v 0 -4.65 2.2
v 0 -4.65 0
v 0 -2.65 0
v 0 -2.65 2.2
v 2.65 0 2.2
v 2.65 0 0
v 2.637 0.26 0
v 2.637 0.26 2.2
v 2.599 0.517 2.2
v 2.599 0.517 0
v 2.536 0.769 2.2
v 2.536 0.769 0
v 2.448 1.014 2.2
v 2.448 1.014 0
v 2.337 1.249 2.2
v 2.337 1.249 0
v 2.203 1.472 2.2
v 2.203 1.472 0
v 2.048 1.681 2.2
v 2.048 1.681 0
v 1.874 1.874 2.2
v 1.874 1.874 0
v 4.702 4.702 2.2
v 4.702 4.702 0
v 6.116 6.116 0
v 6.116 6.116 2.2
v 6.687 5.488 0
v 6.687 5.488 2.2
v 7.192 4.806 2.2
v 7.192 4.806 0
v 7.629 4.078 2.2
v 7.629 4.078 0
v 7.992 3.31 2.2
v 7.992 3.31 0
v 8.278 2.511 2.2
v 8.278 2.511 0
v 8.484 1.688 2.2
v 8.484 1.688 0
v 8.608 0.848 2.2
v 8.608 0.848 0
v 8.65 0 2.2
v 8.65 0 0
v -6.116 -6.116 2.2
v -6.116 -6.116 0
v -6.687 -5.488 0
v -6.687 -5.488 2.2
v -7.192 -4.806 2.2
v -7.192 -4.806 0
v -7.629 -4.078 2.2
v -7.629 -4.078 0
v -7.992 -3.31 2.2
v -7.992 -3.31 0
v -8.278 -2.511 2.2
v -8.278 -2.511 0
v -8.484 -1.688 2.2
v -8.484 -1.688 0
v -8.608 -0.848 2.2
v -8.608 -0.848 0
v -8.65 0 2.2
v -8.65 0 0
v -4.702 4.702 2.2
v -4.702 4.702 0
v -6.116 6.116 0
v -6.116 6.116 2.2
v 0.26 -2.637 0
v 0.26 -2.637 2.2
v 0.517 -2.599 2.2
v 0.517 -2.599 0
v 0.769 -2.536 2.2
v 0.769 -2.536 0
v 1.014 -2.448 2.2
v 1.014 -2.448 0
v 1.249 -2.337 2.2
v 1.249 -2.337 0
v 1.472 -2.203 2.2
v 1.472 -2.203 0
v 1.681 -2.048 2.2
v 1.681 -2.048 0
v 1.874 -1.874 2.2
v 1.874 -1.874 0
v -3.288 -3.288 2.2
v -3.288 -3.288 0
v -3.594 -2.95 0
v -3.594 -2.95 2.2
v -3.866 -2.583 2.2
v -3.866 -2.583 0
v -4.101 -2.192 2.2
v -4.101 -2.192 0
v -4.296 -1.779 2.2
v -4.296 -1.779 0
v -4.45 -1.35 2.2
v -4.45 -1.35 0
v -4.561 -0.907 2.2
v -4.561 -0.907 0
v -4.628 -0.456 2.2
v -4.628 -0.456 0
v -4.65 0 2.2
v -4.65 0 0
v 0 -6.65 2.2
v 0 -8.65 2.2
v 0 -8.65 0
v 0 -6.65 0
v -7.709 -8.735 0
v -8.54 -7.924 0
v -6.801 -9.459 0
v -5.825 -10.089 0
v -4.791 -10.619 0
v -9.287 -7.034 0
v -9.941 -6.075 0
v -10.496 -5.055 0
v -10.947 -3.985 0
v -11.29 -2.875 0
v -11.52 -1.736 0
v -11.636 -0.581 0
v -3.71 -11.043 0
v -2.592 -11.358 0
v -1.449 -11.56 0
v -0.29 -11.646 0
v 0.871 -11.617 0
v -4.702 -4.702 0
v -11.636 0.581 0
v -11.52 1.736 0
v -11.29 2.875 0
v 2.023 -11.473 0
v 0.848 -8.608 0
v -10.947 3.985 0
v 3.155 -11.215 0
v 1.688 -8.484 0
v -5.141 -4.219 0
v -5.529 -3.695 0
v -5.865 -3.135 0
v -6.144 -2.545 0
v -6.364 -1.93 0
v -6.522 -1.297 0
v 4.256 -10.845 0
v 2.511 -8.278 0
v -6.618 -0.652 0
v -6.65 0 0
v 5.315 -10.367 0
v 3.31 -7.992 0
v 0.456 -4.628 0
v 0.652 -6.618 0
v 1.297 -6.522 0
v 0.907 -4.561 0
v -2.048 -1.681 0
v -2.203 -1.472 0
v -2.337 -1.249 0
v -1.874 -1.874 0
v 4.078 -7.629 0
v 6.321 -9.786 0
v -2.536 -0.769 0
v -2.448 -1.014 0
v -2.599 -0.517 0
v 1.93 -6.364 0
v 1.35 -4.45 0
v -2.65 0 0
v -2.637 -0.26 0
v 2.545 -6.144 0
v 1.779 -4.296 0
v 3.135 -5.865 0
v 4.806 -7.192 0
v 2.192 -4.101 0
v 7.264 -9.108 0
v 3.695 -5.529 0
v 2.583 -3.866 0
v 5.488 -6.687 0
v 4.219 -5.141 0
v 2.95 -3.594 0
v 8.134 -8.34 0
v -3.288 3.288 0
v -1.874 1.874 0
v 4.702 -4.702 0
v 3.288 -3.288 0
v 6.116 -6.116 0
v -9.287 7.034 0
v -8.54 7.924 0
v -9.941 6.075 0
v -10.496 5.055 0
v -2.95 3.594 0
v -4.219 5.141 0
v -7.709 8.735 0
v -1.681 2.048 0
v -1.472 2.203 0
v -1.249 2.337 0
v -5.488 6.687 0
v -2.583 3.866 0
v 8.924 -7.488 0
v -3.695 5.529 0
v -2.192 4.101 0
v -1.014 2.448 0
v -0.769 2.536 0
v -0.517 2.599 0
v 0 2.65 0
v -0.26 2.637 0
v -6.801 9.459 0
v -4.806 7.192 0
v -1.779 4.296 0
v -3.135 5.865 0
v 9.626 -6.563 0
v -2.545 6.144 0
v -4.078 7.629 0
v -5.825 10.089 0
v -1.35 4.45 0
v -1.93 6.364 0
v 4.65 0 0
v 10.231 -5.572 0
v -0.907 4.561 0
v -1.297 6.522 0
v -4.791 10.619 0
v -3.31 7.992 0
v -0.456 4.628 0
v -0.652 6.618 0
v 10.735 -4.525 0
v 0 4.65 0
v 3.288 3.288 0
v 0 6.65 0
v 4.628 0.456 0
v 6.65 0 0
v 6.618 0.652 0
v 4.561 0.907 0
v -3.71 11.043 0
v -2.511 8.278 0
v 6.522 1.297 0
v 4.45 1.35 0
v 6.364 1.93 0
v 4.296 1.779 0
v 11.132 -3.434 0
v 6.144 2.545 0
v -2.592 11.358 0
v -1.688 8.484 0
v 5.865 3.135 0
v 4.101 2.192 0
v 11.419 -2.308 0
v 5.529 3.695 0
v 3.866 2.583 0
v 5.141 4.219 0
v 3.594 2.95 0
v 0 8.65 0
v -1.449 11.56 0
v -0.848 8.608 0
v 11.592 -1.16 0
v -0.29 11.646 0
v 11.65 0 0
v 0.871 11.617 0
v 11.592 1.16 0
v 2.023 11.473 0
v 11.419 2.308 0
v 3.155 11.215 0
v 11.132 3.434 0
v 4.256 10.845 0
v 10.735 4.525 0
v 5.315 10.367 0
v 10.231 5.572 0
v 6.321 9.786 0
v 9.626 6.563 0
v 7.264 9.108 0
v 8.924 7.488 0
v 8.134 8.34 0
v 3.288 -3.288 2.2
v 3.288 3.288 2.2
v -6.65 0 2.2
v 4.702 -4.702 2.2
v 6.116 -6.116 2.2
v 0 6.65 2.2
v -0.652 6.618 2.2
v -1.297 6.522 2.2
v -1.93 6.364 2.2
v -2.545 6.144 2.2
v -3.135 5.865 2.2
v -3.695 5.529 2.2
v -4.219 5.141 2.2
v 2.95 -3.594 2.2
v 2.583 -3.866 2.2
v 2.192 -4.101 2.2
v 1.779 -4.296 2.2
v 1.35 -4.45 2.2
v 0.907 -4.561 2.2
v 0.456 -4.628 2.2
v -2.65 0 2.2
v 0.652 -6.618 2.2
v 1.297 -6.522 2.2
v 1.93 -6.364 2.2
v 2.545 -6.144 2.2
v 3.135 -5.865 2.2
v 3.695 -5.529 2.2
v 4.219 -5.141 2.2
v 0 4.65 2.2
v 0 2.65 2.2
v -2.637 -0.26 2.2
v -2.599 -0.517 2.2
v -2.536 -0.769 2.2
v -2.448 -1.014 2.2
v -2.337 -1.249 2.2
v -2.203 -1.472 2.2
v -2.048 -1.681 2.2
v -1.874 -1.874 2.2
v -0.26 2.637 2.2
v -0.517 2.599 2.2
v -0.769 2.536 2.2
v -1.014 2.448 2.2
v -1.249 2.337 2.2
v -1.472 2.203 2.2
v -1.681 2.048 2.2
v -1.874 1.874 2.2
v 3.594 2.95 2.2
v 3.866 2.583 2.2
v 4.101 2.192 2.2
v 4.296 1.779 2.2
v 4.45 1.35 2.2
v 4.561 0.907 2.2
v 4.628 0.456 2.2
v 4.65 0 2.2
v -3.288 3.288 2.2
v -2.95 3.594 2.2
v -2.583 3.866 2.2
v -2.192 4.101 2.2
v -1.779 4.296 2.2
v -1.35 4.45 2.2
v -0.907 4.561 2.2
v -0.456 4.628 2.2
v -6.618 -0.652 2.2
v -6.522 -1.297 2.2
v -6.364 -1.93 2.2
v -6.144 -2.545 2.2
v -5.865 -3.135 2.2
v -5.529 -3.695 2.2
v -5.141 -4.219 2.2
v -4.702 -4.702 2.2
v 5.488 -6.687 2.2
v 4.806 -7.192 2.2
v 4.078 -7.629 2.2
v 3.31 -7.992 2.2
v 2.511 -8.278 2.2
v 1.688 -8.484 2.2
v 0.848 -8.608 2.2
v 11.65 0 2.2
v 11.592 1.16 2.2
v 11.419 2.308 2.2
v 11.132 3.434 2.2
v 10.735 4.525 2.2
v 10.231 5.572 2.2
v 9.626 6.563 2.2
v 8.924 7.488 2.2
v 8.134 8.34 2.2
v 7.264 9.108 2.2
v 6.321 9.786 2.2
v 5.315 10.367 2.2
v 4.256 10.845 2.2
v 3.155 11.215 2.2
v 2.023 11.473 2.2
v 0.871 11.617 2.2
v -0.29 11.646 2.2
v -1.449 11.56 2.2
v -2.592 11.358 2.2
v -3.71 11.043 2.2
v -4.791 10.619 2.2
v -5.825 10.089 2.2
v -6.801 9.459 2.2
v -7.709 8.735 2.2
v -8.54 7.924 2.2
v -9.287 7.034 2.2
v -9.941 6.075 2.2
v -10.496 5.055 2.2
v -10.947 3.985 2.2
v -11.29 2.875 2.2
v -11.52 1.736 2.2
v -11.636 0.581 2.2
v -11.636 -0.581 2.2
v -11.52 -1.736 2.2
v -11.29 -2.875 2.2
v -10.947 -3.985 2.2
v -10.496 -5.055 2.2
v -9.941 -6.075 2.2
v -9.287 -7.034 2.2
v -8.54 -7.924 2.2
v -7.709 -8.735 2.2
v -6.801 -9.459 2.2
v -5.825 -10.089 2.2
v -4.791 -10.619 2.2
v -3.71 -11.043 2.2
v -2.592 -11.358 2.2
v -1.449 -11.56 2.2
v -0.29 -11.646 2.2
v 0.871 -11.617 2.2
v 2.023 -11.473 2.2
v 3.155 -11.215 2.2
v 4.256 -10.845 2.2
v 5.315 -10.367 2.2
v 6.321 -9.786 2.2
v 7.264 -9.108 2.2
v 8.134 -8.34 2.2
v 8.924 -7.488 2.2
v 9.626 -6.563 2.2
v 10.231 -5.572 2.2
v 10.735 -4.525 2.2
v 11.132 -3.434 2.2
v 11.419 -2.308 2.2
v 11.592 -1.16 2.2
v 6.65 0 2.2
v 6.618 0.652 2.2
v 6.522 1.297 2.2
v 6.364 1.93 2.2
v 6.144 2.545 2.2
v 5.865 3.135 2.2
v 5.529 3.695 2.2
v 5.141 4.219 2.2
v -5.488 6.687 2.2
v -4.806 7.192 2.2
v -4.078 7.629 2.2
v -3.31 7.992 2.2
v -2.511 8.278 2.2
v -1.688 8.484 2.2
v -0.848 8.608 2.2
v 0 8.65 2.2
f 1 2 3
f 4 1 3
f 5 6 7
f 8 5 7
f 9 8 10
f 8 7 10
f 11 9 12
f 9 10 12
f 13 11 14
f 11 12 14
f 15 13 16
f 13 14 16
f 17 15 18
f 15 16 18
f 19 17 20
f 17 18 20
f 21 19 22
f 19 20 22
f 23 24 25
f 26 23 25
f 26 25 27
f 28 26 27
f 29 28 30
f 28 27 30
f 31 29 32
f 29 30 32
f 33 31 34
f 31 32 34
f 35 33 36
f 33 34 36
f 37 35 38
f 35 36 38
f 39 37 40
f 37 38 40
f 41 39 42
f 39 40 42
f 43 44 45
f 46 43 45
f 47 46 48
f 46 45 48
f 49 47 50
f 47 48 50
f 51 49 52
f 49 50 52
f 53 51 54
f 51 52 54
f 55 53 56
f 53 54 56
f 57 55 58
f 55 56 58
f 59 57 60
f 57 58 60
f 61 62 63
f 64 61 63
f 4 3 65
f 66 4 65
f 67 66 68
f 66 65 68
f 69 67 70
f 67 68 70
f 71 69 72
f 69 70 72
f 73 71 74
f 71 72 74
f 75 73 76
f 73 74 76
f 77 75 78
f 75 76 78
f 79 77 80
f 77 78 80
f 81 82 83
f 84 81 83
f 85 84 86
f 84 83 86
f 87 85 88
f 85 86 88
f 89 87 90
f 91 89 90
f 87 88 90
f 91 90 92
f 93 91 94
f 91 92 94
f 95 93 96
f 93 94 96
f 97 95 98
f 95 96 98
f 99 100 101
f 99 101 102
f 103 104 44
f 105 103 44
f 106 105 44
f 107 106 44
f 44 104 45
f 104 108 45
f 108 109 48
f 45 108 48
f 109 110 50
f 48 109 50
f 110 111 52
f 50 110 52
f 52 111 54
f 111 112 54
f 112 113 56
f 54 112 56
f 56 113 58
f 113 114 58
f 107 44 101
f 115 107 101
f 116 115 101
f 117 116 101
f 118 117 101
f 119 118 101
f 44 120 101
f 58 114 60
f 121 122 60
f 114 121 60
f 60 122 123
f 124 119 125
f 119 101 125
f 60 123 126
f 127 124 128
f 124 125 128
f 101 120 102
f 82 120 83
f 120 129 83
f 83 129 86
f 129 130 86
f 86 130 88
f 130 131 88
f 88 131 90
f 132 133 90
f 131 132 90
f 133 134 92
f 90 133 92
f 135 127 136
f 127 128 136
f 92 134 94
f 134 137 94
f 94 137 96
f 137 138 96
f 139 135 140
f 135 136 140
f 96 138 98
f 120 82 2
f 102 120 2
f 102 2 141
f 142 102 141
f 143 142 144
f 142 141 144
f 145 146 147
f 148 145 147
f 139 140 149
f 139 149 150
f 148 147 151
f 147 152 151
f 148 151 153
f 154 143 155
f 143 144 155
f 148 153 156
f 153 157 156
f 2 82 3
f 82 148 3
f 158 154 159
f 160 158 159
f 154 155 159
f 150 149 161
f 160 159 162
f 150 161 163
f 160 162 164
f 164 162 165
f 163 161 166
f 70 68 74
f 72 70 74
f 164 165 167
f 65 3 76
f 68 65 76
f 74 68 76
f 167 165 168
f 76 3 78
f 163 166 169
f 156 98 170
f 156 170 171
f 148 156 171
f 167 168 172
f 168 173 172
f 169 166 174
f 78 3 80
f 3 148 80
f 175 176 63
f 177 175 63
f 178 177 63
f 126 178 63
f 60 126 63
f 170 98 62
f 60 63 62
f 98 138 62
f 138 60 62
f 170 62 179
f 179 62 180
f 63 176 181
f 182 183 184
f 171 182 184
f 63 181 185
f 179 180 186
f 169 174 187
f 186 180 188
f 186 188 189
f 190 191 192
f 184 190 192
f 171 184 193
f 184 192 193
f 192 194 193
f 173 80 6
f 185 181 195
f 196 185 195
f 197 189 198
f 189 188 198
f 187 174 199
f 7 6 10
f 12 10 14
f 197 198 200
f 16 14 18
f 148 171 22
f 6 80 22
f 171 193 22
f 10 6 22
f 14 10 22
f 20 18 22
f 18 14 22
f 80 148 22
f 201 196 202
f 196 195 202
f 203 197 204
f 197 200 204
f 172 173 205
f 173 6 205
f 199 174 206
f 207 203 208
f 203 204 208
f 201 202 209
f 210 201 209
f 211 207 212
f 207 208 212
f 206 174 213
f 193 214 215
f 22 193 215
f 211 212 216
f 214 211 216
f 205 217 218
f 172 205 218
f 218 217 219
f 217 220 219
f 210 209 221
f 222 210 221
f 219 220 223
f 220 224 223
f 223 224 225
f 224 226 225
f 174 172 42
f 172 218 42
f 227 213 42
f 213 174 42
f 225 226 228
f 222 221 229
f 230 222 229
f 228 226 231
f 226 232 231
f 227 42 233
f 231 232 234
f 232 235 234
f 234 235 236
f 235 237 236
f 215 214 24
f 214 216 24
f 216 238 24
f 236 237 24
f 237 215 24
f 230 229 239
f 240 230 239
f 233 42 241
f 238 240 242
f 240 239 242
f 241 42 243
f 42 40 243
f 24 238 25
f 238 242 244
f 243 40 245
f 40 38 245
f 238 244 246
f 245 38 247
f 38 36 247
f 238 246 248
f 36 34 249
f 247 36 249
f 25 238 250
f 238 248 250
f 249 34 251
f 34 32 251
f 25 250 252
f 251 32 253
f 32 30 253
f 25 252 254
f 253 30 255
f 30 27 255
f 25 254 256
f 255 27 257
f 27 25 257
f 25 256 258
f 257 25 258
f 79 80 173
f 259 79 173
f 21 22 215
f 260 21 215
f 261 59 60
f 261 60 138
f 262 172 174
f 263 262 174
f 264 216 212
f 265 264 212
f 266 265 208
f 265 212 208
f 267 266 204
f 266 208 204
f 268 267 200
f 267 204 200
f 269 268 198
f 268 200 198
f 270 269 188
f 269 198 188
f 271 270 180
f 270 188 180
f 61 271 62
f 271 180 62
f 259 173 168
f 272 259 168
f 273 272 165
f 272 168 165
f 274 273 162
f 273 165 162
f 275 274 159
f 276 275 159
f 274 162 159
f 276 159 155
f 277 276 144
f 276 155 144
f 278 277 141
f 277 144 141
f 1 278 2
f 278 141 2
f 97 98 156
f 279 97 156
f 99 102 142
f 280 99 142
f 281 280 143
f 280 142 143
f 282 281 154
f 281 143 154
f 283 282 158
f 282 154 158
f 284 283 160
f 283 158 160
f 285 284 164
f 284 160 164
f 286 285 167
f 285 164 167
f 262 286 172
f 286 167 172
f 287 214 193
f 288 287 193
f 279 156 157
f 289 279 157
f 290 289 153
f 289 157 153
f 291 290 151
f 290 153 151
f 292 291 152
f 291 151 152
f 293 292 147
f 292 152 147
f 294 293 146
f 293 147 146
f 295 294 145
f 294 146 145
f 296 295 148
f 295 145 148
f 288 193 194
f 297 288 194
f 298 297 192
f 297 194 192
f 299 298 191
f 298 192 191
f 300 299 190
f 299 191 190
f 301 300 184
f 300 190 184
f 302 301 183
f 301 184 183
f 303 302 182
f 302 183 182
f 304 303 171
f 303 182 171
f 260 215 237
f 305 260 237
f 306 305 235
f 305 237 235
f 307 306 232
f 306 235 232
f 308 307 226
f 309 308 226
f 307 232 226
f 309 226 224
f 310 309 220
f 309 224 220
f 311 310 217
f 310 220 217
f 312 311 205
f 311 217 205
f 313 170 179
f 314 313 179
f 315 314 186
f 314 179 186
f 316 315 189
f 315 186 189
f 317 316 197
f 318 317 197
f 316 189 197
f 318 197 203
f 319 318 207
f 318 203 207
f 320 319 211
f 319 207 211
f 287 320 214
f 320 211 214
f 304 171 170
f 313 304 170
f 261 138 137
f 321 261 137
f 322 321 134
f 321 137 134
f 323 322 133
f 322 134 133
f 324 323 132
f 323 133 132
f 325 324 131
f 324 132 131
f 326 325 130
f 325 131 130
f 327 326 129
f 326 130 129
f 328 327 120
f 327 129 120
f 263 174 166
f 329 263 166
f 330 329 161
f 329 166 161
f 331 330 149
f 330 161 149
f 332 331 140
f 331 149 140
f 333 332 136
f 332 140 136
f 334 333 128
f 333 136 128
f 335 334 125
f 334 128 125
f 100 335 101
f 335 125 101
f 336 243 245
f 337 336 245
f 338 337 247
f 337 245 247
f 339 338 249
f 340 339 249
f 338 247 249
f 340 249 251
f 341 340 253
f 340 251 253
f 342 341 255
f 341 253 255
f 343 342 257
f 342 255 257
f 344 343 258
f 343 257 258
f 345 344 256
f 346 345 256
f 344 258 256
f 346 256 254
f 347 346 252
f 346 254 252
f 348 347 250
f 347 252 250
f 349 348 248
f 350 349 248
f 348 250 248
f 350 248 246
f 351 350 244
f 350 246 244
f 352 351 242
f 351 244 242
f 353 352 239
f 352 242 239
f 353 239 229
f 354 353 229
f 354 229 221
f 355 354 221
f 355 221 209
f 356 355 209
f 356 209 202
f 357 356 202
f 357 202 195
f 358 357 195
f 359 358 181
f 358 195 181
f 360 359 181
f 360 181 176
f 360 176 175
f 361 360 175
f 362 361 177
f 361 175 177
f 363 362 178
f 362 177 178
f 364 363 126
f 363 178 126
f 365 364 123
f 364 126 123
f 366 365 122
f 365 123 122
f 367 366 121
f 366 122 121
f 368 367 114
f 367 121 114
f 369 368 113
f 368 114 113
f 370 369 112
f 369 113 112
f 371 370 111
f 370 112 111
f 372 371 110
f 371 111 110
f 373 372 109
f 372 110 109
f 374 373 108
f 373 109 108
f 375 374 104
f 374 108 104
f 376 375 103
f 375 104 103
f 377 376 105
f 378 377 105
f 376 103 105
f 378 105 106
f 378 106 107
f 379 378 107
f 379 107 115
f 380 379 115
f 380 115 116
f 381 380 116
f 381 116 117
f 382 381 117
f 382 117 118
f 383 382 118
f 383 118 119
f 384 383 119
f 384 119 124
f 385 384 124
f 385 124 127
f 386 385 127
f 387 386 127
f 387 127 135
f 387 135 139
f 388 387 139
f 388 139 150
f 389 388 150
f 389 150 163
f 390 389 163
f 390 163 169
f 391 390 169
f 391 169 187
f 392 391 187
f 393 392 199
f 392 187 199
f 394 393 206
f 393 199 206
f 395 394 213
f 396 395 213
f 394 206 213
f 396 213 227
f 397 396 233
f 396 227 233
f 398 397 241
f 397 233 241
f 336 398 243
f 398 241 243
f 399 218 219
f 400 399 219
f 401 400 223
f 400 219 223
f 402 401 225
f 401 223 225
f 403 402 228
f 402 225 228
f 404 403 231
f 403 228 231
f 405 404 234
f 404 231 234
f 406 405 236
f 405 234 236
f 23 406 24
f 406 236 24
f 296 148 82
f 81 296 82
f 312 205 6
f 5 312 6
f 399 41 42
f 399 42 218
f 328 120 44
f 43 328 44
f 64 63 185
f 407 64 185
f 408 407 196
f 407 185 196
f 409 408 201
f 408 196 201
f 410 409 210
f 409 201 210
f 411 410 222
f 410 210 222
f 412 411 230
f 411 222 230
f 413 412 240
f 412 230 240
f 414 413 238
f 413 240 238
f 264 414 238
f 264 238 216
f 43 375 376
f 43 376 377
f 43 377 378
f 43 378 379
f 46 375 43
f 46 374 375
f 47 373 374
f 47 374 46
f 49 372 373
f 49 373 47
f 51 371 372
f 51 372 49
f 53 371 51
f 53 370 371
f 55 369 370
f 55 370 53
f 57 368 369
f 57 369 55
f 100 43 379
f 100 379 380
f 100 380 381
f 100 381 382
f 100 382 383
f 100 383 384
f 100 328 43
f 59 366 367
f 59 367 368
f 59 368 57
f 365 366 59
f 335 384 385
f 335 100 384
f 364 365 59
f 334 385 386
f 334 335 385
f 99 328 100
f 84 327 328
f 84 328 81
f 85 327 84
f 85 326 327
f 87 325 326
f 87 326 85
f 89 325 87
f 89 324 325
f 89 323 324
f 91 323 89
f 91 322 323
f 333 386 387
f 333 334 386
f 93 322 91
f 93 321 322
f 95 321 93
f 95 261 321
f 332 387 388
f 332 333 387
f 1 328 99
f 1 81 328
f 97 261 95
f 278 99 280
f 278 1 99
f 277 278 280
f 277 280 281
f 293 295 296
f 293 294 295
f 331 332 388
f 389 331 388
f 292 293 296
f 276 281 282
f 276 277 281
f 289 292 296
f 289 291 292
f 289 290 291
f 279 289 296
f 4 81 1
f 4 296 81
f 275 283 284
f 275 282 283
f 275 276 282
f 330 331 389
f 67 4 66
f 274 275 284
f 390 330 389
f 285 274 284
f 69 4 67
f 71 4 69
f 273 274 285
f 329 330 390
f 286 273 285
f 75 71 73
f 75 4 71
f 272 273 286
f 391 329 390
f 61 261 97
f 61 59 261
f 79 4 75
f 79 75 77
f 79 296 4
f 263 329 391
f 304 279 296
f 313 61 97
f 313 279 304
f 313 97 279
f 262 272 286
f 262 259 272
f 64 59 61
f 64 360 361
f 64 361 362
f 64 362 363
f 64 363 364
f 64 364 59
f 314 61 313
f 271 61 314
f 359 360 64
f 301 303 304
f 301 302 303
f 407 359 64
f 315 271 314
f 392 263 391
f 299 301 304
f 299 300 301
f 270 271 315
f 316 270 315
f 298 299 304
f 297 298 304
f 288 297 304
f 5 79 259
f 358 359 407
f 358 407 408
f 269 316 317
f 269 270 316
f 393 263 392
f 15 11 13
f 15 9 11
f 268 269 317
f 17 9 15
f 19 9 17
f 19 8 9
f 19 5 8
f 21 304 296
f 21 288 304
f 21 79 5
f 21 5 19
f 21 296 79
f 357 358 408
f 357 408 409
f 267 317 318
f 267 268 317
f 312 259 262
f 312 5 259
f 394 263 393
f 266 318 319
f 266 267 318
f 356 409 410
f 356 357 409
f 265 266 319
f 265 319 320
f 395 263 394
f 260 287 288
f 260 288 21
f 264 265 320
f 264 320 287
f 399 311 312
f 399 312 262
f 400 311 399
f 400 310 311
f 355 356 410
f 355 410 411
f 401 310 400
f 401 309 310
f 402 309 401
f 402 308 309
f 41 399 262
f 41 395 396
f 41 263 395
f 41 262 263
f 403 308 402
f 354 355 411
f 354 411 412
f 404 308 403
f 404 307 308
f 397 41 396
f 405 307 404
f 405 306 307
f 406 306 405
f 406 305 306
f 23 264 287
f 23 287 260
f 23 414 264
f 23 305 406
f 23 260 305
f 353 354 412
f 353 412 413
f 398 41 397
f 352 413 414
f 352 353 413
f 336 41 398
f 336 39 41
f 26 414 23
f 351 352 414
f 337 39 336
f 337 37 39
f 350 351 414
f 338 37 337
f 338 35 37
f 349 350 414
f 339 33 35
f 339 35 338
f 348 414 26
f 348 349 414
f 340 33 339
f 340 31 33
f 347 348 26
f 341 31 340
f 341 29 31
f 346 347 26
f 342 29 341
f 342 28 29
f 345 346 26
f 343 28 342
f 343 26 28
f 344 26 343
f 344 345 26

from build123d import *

# Parameters (mm, degrees)
F0_R     = 11.65
F1_DEPTH = 2.2
F3_DEPTH = 25


with BuildPart() as f1:
    # F0 (on Top) → F1 (new body)
    with BuildSketch(Plane.XY):
        Circle(F0_R)
    extrude(amount=F1_DEPTH)

    # F2 (on face) → F3 (cut)
    with BuildSketch(Plane(origin=(0, 0, 0), x_dir=(1, 0, 0), z_dir=(0, 0, -1))):
        with BuildLine():
            ThreePointArc((-6.1164736573, -6.1164736573), (-3.31021169, -7.9915579562), (0, -8.65))
            Line((0, -8.65), (0, -6.65))
            ThreePointArc((0, -6.65), (-2.5448448252, -6.1437988912), (-4.7022600949, -4.7022600949))
            Line((-4.7022600949, -4.7022600949), (-6.1164736573, -6.1164736573))
        make_face()
        with BuildLine():
            ThreePointArc((-3.2880465325, -3.2880465325), (-1.7794779605, -4.2960398262), (0, -4.65))
            Line((0, -4.65), (0, -2.65))
            ThreePointArc((0, -2.65), (-1.0141110958, -2.4482807612), (-1.8738329701, -1.8738329701))
            Line((-1.8738329701, -1.8738329701), (-3.2880465325, -3.2880465325))
        make_face()
        with BuildLine():
            ThreePointArc((6.1164736573, -6.1164736573), (7.9915579562, -3.31021169), (8.65, 0))
            Line((8.65, 0), (6.65, 0))
            ThreePointArc((6.65, 0), (6.1437988912, -2.5448448252), (4.7022600949, -4.7022600949))
            Line((4.7022600949, -4.7022600949), (6.1164736573, -6.1164736573))
        make_face()
        with BuildLine():
            ThreePointArc((3.2880465325, -3.2880465325), (4.2960398262, -1.7794779605), (4.65, 0))
            Line((4.65, 0), (2.65, 0))
            ThreePointArc((2.65, 0), (2.4482807612, -1.0141110958), (1.8738329701, -1.8738329701))
            Line((1.8738329701, -1.8738329701), (3.2880465325, -3.2880465325))
        make_face()
        with BuildLine():
            Line((4.7022600949, 4.7022600949), (6.1164736573, 6.1164736573))
            ThreePointArc((6.1164736573, 6.1164736573), (3.31021169, 7.9915579562), (0, 8.65))
            Line((0, 8.65), (0, 6.65))
            ThreePointArc((0, 6.65), (2.5448448252, 6.1437988912), (4.7022600949, 4.7022600949))
        make_face()
        with BuildLine():
            Line((1.8738329701, 1.8738329701), (3.2880465325, 3.2880465325))
            ThreePointArc((3.2880465325, 3.2880465325), (1.7794779605, 4.2960398262), (0, 4.65))
            Line((0, 4.65), (0, 2.65))
            ThreePointArc((0, 2.65), (1.0141110958, 2.4482807612), (1.8738329701, 1.8738329701))
        make_face()
        with BuildLine():
            Line((-1.8738329701, 1.8738329701), (-3.2880465325, 3.2880465325))
            ThreePointArc((-3.2880465325, 3.2880465325), (-4.2960398262, 1.7794779605), (-4.65, 0))
            Line((-4.65, 0), (-2.65, 0))
            ThreePointArc((-2.65, 0), (-2.4482807612, 1.0141110958), (-1.8738329701, 1.8738329701))
        make_face()
        with BuildLine():
            Line((-4.7022600949, 4.7022600949), (-6.1164736573, 6.1164736573))
            ThreePointArc((-6.1164736573, 6.1164736573), (-7.9915579562, 3.31021169), (-8.65, 0))
            Line((-8.65, 0), (-6.65, 0))
            ThreePointArc((-6.65, 0), (-6.1437988912, 2.5448448252), (-4.7022600949, 4.7022600949))
        make_face()
    extrude(amount=-F3_DEPTH, mode=Mode.SUBTRACT)


solid = f1.part
